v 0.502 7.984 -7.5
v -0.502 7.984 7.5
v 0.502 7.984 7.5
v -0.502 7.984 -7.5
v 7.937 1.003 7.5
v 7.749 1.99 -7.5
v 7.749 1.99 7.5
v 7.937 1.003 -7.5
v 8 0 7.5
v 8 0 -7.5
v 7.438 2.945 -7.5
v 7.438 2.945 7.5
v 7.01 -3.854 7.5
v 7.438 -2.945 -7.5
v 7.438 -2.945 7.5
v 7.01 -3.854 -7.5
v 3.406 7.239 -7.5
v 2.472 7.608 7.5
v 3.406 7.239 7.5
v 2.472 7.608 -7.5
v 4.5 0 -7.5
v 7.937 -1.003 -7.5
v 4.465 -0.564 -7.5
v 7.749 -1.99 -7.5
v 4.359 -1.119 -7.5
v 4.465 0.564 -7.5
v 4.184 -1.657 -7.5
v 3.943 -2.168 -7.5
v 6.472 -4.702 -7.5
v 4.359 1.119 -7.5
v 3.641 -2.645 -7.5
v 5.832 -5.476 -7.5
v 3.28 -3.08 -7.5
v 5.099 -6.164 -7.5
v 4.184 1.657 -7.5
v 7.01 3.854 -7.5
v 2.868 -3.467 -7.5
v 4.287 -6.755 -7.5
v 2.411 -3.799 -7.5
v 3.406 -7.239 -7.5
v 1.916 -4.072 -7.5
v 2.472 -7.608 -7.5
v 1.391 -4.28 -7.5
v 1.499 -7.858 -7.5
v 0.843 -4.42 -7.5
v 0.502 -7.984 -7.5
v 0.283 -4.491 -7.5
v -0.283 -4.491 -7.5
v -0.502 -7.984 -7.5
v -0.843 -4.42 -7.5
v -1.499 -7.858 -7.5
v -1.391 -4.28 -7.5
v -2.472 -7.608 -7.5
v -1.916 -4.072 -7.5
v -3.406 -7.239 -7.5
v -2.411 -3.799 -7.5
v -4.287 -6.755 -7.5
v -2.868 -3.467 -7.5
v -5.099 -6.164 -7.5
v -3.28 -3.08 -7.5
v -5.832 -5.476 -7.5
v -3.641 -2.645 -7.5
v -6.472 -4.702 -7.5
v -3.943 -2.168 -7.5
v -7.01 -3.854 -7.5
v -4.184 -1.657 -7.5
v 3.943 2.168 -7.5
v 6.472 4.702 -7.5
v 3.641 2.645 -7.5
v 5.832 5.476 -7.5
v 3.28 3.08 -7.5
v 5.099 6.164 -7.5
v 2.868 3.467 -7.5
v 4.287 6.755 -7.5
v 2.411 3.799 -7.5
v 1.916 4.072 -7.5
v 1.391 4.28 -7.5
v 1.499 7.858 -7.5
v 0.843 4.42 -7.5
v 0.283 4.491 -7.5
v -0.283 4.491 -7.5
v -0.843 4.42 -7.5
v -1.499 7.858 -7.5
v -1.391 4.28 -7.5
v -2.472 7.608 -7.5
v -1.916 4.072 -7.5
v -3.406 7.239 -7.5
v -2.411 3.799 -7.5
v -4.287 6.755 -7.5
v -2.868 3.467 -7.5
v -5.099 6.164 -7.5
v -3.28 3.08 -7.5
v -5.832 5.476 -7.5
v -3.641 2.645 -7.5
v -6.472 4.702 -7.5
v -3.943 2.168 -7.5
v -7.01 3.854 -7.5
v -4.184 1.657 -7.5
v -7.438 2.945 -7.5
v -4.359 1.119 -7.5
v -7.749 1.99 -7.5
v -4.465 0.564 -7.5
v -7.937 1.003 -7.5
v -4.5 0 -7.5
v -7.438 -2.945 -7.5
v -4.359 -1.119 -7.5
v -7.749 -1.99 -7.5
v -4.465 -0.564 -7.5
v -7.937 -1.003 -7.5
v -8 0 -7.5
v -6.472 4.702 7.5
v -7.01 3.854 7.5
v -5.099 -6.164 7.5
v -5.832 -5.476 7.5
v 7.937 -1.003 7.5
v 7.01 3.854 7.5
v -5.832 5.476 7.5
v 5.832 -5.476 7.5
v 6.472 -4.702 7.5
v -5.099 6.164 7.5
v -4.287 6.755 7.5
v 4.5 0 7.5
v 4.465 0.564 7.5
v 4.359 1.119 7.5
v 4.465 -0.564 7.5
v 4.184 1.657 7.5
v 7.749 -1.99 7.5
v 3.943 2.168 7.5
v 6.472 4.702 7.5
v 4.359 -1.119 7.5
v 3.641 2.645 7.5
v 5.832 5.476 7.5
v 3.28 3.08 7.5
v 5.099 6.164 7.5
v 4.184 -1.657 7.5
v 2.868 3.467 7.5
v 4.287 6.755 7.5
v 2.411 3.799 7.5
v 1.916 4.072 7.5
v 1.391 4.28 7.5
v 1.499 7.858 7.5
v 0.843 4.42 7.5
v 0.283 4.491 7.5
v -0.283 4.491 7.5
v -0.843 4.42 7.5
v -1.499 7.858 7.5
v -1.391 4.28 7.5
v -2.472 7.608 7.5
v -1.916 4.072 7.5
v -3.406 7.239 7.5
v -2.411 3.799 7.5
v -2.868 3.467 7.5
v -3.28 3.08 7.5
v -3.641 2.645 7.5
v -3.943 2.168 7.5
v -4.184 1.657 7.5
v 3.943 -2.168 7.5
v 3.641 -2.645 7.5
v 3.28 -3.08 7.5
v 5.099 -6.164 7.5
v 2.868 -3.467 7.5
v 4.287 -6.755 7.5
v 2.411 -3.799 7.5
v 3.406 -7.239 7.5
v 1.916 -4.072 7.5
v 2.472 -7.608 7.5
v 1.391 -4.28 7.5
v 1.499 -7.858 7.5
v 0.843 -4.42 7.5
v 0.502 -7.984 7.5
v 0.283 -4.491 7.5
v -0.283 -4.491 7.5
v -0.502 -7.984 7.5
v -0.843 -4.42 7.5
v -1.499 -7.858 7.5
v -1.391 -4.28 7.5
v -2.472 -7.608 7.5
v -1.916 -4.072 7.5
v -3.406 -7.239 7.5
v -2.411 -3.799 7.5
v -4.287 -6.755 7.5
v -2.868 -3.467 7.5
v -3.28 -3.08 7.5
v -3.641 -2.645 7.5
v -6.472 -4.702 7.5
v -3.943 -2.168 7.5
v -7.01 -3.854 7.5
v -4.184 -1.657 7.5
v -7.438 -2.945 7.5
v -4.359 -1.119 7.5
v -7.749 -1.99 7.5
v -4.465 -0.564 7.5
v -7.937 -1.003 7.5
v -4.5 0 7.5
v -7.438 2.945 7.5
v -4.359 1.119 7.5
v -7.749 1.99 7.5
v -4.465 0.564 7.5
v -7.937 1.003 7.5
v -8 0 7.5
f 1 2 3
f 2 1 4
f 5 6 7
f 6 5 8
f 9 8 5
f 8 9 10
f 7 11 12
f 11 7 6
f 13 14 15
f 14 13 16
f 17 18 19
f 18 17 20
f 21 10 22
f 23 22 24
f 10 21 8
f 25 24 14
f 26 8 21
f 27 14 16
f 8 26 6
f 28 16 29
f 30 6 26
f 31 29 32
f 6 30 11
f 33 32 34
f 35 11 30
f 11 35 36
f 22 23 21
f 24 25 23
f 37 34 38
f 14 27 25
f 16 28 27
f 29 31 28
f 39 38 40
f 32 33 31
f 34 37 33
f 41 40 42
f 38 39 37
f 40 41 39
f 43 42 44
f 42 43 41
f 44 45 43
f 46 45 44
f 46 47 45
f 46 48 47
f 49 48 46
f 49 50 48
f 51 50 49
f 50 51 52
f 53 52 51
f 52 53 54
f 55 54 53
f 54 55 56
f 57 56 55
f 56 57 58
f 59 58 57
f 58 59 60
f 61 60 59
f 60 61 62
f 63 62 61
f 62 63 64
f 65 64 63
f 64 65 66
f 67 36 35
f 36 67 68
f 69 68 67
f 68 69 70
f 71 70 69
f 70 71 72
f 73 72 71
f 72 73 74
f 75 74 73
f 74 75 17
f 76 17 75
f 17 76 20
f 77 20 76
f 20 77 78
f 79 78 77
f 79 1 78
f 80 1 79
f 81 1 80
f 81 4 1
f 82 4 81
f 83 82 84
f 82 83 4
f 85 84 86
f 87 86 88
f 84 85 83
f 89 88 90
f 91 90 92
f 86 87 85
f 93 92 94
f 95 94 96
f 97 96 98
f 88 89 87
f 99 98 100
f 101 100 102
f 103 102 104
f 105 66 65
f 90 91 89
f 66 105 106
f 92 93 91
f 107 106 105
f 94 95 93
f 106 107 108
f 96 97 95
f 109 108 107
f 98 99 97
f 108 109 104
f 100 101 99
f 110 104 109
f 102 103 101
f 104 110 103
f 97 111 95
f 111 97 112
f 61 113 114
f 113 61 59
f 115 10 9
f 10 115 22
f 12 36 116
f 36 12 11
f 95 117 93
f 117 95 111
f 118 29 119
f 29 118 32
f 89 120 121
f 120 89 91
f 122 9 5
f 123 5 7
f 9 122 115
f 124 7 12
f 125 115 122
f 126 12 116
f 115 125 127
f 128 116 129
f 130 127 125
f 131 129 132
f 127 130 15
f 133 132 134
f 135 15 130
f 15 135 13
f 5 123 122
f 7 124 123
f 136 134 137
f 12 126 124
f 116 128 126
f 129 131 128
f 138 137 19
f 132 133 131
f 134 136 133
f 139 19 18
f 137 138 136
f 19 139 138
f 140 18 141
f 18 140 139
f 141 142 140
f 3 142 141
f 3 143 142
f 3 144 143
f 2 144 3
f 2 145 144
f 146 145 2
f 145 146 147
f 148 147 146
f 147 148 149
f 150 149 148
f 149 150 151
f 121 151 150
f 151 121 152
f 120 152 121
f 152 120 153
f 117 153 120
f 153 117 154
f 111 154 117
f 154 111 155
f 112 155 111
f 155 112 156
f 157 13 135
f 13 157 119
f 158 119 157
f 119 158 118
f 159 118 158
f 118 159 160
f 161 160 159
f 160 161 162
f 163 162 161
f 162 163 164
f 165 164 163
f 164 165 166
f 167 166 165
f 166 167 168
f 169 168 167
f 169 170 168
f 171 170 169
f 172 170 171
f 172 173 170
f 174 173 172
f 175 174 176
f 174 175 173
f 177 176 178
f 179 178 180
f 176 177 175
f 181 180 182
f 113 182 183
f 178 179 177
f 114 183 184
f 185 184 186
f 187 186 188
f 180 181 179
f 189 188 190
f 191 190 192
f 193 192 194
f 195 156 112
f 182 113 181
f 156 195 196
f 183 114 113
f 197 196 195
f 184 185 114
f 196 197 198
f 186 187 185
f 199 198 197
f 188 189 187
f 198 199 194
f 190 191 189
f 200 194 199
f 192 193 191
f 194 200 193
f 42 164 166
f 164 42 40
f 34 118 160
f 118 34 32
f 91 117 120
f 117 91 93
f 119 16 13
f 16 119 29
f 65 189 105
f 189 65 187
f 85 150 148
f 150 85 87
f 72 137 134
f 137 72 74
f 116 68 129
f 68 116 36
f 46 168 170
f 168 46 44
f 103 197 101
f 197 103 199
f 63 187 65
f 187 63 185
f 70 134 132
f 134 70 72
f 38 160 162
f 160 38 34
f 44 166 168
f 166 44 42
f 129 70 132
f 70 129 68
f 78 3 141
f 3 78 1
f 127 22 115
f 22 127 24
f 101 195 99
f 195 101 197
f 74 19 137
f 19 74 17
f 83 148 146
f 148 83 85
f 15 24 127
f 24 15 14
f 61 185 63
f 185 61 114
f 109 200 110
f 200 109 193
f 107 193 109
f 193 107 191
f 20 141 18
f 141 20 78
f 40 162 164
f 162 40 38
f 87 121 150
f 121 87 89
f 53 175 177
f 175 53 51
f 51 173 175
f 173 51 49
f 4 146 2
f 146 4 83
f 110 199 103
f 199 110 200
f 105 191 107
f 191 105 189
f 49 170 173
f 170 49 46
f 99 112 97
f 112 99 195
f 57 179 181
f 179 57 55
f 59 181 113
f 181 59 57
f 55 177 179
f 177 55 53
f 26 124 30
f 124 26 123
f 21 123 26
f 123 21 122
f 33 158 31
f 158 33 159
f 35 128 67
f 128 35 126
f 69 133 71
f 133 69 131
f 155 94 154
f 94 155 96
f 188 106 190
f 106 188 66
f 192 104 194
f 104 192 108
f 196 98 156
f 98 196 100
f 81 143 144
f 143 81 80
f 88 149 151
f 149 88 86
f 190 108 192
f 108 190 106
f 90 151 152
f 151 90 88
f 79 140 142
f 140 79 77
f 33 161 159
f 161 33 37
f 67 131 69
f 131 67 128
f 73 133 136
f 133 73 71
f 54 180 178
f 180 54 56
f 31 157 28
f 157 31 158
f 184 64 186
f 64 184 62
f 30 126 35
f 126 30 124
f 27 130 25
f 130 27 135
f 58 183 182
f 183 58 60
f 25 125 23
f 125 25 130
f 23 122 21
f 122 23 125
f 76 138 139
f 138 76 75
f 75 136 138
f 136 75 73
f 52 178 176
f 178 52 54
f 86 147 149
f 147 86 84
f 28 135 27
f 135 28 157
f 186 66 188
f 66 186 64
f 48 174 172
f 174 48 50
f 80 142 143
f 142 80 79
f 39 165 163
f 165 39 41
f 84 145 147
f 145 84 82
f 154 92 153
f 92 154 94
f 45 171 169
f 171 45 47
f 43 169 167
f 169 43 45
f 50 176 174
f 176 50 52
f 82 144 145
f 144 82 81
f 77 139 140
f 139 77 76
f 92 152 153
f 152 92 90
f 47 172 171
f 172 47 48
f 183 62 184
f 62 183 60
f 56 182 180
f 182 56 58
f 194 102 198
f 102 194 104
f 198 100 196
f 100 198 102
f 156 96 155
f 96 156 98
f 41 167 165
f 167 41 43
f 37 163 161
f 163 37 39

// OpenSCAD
$fn = 50;


difference() {
	union() {
		translate(v = [0, 0, -7.5000000000]) {
			cylinder(h = 15, r = 8.0000000000);
		}
	}
	union() {
		translate(v = [0, 0, -100.0000000000]) {
			cylinder(h = 200, r = 4.5000000000);
		}
	}
}
